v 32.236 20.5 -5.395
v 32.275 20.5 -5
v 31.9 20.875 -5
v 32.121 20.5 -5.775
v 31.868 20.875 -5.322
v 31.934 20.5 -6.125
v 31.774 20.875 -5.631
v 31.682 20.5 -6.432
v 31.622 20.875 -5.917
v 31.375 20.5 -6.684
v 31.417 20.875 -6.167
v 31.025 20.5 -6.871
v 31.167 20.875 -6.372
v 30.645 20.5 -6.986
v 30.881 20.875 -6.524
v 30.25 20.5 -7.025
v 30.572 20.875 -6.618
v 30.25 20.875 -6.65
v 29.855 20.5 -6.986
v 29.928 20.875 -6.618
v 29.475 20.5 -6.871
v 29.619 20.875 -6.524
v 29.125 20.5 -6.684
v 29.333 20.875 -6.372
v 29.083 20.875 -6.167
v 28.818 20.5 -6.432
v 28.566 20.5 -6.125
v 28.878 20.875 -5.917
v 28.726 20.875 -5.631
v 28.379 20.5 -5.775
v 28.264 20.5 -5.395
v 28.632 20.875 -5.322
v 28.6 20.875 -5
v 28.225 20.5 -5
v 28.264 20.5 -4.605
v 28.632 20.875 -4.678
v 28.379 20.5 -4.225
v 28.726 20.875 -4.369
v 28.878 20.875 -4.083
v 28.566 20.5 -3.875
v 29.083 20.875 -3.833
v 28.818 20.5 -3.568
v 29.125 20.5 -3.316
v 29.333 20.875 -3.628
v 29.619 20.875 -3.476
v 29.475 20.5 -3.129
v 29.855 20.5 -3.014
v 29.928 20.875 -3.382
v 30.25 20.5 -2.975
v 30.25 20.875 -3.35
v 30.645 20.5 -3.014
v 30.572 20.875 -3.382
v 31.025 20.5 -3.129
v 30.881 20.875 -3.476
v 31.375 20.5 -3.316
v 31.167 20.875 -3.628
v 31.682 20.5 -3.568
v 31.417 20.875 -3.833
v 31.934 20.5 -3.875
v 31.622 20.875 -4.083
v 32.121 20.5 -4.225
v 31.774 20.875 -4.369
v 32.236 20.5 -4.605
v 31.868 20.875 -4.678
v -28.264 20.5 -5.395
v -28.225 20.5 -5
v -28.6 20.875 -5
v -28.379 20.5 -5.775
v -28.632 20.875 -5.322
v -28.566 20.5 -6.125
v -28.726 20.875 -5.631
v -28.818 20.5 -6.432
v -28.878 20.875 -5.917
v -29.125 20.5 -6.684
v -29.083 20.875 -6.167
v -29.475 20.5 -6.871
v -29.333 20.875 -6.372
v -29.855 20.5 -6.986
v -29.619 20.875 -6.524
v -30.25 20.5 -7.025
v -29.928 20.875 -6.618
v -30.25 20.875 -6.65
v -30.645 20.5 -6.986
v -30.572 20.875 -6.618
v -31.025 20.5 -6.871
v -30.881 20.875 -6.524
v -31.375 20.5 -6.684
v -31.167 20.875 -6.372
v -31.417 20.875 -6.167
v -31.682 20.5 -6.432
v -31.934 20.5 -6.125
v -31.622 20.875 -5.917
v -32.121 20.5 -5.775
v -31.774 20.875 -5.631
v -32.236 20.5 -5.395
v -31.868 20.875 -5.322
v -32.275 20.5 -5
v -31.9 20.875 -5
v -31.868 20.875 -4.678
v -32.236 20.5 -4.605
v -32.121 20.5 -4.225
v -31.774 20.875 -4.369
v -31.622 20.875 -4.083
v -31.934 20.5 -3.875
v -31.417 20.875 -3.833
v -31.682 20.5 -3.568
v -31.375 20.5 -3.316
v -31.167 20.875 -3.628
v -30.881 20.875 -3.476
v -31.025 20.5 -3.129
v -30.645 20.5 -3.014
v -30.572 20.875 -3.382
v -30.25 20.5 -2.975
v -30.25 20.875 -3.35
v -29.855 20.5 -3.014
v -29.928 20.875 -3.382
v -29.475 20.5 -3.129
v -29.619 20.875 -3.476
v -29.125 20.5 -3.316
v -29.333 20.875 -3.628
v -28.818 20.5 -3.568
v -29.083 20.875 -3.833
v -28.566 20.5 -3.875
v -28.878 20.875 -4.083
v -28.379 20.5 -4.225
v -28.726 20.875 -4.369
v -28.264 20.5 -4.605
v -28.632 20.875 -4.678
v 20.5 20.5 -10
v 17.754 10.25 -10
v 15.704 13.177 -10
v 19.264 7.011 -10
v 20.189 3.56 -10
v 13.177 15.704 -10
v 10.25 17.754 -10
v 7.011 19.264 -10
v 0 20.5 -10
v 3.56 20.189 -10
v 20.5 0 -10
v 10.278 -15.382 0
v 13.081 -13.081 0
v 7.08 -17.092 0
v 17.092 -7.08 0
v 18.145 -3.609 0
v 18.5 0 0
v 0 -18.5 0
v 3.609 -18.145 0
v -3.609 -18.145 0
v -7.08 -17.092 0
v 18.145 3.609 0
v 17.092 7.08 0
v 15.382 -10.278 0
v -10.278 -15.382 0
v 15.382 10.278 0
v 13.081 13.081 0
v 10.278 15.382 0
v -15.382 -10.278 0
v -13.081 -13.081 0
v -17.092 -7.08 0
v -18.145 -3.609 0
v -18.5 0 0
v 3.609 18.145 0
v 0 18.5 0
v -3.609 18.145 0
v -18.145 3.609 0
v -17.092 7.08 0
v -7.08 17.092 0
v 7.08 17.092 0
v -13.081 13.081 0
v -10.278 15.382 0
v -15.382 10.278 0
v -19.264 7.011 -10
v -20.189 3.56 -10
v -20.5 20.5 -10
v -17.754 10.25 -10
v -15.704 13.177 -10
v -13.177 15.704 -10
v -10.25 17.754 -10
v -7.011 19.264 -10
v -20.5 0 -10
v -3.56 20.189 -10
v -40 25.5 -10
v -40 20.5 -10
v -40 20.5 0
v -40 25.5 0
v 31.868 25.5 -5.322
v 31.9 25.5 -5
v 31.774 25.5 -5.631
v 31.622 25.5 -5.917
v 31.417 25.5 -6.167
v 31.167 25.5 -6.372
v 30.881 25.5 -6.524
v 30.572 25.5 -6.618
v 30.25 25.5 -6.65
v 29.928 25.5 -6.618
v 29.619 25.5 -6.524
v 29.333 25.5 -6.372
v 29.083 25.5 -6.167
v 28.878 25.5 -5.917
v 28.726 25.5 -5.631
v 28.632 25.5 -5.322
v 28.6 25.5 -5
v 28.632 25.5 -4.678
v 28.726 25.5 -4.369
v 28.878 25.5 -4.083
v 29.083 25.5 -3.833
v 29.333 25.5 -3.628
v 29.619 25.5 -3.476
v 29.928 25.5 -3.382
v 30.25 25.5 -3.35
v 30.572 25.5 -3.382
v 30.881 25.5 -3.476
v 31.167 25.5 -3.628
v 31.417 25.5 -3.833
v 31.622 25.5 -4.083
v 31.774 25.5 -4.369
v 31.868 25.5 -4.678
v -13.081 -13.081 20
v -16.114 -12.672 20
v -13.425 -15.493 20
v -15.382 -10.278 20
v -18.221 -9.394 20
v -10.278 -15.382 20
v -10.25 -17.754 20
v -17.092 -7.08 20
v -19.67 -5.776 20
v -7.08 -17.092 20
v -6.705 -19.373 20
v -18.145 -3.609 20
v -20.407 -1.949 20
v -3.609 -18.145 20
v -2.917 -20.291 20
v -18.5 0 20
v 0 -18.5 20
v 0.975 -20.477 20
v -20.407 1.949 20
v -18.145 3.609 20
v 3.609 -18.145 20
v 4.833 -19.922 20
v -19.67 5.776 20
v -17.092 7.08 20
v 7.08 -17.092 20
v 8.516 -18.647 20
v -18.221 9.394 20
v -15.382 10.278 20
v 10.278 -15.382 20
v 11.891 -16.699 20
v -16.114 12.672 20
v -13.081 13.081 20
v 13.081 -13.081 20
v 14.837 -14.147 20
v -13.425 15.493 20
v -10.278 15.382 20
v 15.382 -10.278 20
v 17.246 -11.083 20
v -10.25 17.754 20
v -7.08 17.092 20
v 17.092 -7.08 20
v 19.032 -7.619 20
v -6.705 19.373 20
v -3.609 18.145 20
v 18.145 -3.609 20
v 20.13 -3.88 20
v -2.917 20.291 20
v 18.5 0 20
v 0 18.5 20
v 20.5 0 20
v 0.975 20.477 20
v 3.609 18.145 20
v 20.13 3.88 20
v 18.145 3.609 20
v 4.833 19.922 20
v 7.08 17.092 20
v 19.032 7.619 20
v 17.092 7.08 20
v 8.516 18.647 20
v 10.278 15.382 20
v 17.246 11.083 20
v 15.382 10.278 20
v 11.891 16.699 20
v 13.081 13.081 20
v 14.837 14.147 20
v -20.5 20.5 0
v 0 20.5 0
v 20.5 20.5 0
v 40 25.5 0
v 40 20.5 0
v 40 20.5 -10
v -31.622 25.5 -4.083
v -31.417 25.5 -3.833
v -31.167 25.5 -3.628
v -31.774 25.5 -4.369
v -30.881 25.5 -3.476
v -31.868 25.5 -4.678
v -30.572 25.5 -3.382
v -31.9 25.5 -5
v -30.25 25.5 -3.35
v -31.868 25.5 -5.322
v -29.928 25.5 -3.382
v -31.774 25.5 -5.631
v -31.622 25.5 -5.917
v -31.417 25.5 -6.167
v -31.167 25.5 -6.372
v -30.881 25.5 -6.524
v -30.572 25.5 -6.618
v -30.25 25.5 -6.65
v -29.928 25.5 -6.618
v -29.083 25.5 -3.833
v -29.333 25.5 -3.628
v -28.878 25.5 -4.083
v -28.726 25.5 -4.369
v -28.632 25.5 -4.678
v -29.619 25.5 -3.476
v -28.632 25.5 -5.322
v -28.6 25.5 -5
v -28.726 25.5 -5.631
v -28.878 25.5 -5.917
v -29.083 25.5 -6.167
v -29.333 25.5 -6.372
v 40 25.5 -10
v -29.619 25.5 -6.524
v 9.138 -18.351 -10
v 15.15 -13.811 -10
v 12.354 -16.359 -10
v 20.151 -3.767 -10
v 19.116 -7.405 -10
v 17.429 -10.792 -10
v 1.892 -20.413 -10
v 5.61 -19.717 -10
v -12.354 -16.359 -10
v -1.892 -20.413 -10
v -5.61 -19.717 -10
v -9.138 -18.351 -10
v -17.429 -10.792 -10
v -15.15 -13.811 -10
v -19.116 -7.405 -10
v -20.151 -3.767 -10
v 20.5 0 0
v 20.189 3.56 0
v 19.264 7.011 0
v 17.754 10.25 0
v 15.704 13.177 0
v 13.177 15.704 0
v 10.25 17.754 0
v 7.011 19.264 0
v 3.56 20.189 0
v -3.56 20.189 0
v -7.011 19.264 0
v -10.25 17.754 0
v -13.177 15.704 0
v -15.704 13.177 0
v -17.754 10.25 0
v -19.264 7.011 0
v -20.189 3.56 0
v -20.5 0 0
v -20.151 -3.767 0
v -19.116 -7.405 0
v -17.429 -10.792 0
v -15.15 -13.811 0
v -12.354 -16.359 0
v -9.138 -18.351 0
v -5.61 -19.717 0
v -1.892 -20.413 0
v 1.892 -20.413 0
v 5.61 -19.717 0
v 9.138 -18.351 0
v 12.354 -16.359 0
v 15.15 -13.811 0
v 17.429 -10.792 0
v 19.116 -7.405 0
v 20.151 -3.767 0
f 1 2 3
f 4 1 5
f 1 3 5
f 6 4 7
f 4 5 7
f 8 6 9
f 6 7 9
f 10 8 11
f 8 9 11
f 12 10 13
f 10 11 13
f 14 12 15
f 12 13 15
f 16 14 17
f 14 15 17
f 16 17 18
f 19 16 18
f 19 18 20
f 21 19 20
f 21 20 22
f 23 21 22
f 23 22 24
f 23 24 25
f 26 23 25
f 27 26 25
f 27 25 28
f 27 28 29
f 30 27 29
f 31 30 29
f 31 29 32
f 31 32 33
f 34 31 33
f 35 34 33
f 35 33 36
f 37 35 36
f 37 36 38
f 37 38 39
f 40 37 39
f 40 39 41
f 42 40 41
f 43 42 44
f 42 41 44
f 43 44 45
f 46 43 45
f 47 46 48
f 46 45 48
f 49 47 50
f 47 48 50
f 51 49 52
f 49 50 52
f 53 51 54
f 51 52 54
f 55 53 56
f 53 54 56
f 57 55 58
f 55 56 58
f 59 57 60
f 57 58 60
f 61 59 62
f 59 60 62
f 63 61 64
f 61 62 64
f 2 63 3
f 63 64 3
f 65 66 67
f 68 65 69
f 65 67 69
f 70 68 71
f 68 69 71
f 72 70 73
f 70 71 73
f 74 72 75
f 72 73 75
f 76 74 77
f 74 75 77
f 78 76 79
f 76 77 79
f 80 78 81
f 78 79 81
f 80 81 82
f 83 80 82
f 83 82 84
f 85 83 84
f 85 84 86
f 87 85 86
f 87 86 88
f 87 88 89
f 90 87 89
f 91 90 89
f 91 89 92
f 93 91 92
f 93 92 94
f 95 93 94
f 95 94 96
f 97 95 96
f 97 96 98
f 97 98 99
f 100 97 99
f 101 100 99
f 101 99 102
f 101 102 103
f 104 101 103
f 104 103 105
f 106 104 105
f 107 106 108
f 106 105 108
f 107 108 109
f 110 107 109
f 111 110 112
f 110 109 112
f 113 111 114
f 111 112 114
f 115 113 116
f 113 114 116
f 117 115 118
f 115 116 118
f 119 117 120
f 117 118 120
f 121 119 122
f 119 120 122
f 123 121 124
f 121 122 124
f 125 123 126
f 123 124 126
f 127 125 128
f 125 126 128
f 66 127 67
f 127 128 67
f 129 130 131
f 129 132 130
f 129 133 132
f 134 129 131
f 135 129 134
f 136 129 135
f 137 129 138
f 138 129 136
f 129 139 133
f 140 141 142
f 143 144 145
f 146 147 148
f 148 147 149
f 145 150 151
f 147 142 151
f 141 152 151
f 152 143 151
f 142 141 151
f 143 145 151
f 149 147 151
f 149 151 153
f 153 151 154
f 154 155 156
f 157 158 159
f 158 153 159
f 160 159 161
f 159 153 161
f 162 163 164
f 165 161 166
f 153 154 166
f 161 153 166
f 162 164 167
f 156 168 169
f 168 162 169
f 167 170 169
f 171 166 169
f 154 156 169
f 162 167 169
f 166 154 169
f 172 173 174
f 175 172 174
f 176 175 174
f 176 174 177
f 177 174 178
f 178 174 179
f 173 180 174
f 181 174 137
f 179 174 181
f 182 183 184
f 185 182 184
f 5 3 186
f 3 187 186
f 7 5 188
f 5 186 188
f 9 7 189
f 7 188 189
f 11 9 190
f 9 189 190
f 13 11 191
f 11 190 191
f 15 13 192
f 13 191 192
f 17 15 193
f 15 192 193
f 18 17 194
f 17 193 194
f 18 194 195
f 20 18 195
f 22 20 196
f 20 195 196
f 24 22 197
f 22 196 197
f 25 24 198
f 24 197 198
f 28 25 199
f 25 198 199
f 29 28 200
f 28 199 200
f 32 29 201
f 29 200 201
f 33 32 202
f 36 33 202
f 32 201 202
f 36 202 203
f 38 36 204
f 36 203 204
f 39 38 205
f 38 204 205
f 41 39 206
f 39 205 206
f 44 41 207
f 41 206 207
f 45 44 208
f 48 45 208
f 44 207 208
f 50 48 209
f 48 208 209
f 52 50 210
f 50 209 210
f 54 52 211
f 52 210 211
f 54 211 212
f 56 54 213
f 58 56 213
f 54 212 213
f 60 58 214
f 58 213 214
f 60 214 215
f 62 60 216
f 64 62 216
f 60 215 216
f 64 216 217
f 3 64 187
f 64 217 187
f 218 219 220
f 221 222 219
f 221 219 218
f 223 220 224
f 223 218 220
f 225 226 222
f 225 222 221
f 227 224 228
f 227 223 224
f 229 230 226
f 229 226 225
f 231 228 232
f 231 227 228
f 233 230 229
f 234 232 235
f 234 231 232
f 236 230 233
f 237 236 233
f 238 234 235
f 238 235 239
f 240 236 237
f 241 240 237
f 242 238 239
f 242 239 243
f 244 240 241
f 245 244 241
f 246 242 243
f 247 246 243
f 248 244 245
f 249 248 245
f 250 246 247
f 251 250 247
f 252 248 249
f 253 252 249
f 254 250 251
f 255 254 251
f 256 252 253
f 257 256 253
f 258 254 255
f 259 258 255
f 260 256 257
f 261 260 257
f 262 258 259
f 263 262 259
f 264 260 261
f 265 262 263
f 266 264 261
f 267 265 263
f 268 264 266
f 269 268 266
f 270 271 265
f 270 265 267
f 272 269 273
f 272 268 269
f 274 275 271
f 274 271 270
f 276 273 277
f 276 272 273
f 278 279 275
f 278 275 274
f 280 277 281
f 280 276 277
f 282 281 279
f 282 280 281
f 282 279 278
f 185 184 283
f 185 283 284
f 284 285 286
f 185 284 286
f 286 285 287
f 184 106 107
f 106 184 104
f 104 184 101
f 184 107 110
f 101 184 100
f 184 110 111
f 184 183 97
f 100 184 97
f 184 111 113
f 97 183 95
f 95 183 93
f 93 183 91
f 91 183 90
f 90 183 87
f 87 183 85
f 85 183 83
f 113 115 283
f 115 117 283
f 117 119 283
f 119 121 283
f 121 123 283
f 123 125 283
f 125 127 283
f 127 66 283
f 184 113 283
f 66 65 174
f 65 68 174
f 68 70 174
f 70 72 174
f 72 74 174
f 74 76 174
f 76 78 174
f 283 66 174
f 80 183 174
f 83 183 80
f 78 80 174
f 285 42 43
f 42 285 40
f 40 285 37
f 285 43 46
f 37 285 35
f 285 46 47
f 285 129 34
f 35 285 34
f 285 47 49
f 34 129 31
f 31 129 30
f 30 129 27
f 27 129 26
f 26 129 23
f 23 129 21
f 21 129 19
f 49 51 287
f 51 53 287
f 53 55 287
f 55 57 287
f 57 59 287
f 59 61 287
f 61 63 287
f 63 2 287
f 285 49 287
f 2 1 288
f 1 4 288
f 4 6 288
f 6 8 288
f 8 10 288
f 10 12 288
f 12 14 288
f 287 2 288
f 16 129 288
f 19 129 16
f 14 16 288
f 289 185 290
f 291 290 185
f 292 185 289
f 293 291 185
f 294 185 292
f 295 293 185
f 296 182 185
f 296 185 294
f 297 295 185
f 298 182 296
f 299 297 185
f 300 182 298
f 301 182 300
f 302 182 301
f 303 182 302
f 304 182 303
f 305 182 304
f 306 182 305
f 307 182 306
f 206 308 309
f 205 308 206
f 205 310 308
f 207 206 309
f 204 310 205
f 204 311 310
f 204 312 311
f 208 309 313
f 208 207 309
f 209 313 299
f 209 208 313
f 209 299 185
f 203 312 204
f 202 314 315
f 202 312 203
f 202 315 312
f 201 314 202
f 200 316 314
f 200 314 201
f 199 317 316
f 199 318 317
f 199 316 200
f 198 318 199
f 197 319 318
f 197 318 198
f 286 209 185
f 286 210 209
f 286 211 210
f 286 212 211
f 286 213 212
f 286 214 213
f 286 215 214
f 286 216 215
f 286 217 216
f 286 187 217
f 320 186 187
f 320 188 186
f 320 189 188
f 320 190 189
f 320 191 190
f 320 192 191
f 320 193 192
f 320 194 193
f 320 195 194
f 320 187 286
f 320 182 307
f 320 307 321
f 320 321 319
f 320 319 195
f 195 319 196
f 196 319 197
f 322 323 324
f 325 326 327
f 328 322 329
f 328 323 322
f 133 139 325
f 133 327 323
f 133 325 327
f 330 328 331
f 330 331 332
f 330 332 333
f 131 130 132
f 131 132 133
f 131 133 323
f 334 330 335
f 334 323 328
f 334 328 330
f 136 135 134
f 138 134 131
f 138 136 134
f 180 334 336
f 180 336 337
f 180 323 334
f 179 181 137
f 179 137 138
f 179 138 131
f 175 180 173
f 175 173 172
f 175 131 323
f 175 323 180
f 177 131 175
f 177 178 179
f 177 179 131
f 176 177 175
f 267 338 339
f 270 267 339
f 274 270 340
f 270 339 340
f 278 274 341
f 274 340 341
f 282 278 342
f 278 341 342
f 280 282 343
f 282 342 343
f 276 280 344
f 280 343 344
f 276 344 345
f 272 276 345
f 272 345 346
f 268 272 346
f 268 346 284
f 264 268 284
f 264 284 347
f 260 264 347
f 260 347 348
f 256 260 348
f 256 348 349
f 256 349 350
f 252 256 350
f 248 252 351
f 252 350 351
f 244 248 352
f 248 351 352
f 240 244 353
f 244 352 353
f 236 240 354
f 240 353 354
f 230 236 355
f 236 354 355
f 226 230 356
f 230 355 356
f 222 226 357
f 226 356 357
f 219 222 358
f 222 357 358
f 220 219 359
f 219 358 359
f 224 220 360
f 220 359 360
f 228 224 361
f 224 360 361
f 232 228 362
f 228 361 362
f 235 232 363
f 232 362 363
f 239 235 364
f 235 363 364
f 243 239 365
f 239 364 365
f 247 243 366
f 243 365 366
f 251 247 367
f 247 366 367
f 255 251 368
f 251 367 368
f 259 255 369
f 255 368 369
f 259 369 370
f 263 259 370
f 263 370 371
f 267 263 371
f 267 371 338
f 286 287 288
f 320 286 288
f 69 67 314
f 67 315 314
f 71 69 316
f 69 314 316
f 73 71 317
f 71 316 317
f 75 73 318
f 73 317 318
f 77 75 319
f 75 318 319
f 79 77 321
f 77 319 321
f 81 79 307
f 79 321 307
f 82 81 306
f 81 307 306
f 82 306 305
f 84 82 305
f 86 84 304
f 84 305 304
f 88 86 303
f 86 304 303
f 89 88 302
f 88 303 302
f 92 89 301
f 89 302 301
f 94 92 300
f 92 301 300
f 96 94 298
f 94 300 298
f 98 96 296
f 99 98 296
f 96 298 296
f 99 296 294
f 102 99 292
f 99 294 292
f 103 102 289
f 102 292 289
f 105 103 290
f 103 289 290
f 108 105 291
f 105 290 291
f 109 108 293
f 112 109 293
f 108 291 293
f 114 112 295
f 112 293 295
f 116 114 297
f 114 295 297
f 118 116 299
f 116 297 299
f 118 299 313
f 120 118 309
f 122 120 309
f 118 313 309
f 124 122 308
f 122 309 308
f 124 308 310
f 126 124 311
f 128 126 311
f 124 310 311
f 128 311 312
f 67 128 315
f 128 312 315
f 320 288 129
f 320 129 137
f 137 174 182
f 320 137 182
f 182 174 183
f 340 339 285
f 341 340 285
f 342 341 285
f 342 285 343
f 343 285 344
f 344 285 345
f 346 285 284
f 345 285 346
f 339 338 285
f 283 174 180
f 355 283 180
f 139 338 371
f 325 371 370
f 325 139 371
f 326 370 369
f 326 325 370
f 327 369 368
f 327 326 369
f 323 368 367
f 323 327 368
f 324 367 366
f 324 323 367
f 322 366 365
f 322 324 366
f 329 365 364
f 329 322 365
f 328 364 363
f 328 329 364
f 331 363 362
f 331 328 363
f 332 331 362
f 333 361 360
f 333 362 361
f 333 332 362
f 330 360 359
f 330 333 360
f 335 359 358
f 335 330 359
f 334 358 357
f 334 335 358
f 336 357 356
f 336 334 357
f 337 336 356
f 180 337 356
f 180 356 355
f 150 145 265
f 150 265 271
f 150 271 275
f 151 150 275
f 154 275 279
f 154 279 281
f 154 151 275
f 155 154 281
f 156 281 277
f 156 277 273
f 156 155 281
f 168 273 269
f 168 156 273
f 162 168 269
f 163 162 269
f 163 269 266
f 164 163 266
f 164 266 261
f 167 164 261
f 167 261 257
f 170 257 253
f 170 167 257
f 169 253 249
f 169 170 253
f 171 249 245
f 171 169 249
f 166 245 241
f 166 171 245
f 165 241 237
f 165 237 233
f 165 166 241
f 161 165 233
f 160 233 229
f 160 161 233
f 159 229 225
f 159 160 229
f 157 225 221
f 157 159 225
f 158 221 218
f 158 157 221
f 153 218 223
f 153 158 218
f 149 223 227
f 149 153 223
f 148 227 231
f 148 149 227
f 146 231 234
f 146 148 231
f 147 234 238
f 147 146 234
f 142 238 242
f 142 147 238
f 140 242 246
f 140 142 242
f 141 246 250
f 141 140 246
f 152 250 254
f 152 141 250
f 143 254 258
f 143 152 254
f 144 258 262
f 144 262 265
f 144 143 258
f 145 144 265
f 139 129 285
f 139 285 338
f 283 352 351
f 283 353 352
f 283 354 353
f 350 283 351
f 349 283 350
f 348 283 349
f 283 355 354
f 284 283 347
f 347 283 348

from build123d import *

# Parameters (mm, degrees)
ESQUISSE1_R                 = 20.5
ESQUISSE1_R_2               = 18.5
BOSS_EXTRU_1_DEPTH          = 20
BOSS_EXTRU_2_START          = 10
ESQUISSE2_R                 = 20.5
BOSS_EXTRU_2_DEPTH          = 10
BOSS_EXTRU_4_DEPTH          = 5
BOSS_EXTRU_5_DEPTH          = 10
TROU_TARAUD_M41_D           = 3.3
TROU_TARAUD_M41_CSINK_D     = 4.05
TROU_TARAUD_M41_CSINK_ANGLE = 90


with BuildPart() as part:
    # Esquisse1 → Boss.-Extru.1 (new body)
    with BuildSketch(Plane.XY):
        Circle(ESQUISSE1_R)
        Circle(ESQUISSE1_R_2, mode=Mode.SUBTRACT)
    extrude(amount=BOSS_EXTRU_1_DEPTH)

    # Esquisse2 → Boss.-Extru.2 (add)
    with BuildSketch(Plane(origin=(0, 0, 0), x_dir=(-1, 0, 0), z_dir=(0, 0, -1)).offset(BOSS_EXTRU_2_START)):
        Circle(ESQUISSE2_R)
    extrude(amount=-BOSS_EXTRU_2_DEPTH)



with BuildPart() as body_2:
    # Esquisse5 → Boss.-Extru.4 (new body)
    with BuildSketch(Plane(origin=(0, 20.5, 0), x_dir=(1, 0, 0), z_dir=(0, 1, 0))):
        Polygon((0, 0), (40, 0), (40, 10), (10, 10), (-40, 10), (-40, 0), align=None)
    extrude(amount=BOSS_EXTRU_4_DEPTH)


with BuildPart() as part_1:
    add(part.part)

    add(body_2.part)  # Boss.-Extru.5 merges body 2
    # Esquisse7 → Boss.-Extru.5 (add)
    with BuildSketch(Plane.XY.offset(-10)):
        with BuildLine():
            ThreePointArc((20.5, 0), (14.495689014, 14.495689014), (0, 20.5))
            Line((0, 20.5), (20.5, 20.5))
            Line((20.5, 20.5), (20.5, 0))
        make_face()
        with BuildLine():
            Line((-20.5, 20.5), (-20.5, 0))
            ThreePointArc((-20.5, 0), (-14.495689014, 14.495689014), (0, 20.5))
            Line((0, 20.5), (-20.5, 20.5))
        make_face()
    extrude(amount=BOSS_EXTRU_5_DEPTH)

    # Trou taraudé M41 (through all)
    with Locations(Plane(origin=(0, 20.5, 0), x_dir=(-1, 0, 0), z_dir=(0, -1, 0))):
        with Locations((-30.25, 5), (30.25, 5)):
            CounterSinkHole(TROU_TARAUD_M41_D / 2, TROU_TARAUD_M41_CSINK_D / 2, counter_sink_angle=TROU_TARAUD_M41_CSINK_ANGLE)


solid = part_1.part
